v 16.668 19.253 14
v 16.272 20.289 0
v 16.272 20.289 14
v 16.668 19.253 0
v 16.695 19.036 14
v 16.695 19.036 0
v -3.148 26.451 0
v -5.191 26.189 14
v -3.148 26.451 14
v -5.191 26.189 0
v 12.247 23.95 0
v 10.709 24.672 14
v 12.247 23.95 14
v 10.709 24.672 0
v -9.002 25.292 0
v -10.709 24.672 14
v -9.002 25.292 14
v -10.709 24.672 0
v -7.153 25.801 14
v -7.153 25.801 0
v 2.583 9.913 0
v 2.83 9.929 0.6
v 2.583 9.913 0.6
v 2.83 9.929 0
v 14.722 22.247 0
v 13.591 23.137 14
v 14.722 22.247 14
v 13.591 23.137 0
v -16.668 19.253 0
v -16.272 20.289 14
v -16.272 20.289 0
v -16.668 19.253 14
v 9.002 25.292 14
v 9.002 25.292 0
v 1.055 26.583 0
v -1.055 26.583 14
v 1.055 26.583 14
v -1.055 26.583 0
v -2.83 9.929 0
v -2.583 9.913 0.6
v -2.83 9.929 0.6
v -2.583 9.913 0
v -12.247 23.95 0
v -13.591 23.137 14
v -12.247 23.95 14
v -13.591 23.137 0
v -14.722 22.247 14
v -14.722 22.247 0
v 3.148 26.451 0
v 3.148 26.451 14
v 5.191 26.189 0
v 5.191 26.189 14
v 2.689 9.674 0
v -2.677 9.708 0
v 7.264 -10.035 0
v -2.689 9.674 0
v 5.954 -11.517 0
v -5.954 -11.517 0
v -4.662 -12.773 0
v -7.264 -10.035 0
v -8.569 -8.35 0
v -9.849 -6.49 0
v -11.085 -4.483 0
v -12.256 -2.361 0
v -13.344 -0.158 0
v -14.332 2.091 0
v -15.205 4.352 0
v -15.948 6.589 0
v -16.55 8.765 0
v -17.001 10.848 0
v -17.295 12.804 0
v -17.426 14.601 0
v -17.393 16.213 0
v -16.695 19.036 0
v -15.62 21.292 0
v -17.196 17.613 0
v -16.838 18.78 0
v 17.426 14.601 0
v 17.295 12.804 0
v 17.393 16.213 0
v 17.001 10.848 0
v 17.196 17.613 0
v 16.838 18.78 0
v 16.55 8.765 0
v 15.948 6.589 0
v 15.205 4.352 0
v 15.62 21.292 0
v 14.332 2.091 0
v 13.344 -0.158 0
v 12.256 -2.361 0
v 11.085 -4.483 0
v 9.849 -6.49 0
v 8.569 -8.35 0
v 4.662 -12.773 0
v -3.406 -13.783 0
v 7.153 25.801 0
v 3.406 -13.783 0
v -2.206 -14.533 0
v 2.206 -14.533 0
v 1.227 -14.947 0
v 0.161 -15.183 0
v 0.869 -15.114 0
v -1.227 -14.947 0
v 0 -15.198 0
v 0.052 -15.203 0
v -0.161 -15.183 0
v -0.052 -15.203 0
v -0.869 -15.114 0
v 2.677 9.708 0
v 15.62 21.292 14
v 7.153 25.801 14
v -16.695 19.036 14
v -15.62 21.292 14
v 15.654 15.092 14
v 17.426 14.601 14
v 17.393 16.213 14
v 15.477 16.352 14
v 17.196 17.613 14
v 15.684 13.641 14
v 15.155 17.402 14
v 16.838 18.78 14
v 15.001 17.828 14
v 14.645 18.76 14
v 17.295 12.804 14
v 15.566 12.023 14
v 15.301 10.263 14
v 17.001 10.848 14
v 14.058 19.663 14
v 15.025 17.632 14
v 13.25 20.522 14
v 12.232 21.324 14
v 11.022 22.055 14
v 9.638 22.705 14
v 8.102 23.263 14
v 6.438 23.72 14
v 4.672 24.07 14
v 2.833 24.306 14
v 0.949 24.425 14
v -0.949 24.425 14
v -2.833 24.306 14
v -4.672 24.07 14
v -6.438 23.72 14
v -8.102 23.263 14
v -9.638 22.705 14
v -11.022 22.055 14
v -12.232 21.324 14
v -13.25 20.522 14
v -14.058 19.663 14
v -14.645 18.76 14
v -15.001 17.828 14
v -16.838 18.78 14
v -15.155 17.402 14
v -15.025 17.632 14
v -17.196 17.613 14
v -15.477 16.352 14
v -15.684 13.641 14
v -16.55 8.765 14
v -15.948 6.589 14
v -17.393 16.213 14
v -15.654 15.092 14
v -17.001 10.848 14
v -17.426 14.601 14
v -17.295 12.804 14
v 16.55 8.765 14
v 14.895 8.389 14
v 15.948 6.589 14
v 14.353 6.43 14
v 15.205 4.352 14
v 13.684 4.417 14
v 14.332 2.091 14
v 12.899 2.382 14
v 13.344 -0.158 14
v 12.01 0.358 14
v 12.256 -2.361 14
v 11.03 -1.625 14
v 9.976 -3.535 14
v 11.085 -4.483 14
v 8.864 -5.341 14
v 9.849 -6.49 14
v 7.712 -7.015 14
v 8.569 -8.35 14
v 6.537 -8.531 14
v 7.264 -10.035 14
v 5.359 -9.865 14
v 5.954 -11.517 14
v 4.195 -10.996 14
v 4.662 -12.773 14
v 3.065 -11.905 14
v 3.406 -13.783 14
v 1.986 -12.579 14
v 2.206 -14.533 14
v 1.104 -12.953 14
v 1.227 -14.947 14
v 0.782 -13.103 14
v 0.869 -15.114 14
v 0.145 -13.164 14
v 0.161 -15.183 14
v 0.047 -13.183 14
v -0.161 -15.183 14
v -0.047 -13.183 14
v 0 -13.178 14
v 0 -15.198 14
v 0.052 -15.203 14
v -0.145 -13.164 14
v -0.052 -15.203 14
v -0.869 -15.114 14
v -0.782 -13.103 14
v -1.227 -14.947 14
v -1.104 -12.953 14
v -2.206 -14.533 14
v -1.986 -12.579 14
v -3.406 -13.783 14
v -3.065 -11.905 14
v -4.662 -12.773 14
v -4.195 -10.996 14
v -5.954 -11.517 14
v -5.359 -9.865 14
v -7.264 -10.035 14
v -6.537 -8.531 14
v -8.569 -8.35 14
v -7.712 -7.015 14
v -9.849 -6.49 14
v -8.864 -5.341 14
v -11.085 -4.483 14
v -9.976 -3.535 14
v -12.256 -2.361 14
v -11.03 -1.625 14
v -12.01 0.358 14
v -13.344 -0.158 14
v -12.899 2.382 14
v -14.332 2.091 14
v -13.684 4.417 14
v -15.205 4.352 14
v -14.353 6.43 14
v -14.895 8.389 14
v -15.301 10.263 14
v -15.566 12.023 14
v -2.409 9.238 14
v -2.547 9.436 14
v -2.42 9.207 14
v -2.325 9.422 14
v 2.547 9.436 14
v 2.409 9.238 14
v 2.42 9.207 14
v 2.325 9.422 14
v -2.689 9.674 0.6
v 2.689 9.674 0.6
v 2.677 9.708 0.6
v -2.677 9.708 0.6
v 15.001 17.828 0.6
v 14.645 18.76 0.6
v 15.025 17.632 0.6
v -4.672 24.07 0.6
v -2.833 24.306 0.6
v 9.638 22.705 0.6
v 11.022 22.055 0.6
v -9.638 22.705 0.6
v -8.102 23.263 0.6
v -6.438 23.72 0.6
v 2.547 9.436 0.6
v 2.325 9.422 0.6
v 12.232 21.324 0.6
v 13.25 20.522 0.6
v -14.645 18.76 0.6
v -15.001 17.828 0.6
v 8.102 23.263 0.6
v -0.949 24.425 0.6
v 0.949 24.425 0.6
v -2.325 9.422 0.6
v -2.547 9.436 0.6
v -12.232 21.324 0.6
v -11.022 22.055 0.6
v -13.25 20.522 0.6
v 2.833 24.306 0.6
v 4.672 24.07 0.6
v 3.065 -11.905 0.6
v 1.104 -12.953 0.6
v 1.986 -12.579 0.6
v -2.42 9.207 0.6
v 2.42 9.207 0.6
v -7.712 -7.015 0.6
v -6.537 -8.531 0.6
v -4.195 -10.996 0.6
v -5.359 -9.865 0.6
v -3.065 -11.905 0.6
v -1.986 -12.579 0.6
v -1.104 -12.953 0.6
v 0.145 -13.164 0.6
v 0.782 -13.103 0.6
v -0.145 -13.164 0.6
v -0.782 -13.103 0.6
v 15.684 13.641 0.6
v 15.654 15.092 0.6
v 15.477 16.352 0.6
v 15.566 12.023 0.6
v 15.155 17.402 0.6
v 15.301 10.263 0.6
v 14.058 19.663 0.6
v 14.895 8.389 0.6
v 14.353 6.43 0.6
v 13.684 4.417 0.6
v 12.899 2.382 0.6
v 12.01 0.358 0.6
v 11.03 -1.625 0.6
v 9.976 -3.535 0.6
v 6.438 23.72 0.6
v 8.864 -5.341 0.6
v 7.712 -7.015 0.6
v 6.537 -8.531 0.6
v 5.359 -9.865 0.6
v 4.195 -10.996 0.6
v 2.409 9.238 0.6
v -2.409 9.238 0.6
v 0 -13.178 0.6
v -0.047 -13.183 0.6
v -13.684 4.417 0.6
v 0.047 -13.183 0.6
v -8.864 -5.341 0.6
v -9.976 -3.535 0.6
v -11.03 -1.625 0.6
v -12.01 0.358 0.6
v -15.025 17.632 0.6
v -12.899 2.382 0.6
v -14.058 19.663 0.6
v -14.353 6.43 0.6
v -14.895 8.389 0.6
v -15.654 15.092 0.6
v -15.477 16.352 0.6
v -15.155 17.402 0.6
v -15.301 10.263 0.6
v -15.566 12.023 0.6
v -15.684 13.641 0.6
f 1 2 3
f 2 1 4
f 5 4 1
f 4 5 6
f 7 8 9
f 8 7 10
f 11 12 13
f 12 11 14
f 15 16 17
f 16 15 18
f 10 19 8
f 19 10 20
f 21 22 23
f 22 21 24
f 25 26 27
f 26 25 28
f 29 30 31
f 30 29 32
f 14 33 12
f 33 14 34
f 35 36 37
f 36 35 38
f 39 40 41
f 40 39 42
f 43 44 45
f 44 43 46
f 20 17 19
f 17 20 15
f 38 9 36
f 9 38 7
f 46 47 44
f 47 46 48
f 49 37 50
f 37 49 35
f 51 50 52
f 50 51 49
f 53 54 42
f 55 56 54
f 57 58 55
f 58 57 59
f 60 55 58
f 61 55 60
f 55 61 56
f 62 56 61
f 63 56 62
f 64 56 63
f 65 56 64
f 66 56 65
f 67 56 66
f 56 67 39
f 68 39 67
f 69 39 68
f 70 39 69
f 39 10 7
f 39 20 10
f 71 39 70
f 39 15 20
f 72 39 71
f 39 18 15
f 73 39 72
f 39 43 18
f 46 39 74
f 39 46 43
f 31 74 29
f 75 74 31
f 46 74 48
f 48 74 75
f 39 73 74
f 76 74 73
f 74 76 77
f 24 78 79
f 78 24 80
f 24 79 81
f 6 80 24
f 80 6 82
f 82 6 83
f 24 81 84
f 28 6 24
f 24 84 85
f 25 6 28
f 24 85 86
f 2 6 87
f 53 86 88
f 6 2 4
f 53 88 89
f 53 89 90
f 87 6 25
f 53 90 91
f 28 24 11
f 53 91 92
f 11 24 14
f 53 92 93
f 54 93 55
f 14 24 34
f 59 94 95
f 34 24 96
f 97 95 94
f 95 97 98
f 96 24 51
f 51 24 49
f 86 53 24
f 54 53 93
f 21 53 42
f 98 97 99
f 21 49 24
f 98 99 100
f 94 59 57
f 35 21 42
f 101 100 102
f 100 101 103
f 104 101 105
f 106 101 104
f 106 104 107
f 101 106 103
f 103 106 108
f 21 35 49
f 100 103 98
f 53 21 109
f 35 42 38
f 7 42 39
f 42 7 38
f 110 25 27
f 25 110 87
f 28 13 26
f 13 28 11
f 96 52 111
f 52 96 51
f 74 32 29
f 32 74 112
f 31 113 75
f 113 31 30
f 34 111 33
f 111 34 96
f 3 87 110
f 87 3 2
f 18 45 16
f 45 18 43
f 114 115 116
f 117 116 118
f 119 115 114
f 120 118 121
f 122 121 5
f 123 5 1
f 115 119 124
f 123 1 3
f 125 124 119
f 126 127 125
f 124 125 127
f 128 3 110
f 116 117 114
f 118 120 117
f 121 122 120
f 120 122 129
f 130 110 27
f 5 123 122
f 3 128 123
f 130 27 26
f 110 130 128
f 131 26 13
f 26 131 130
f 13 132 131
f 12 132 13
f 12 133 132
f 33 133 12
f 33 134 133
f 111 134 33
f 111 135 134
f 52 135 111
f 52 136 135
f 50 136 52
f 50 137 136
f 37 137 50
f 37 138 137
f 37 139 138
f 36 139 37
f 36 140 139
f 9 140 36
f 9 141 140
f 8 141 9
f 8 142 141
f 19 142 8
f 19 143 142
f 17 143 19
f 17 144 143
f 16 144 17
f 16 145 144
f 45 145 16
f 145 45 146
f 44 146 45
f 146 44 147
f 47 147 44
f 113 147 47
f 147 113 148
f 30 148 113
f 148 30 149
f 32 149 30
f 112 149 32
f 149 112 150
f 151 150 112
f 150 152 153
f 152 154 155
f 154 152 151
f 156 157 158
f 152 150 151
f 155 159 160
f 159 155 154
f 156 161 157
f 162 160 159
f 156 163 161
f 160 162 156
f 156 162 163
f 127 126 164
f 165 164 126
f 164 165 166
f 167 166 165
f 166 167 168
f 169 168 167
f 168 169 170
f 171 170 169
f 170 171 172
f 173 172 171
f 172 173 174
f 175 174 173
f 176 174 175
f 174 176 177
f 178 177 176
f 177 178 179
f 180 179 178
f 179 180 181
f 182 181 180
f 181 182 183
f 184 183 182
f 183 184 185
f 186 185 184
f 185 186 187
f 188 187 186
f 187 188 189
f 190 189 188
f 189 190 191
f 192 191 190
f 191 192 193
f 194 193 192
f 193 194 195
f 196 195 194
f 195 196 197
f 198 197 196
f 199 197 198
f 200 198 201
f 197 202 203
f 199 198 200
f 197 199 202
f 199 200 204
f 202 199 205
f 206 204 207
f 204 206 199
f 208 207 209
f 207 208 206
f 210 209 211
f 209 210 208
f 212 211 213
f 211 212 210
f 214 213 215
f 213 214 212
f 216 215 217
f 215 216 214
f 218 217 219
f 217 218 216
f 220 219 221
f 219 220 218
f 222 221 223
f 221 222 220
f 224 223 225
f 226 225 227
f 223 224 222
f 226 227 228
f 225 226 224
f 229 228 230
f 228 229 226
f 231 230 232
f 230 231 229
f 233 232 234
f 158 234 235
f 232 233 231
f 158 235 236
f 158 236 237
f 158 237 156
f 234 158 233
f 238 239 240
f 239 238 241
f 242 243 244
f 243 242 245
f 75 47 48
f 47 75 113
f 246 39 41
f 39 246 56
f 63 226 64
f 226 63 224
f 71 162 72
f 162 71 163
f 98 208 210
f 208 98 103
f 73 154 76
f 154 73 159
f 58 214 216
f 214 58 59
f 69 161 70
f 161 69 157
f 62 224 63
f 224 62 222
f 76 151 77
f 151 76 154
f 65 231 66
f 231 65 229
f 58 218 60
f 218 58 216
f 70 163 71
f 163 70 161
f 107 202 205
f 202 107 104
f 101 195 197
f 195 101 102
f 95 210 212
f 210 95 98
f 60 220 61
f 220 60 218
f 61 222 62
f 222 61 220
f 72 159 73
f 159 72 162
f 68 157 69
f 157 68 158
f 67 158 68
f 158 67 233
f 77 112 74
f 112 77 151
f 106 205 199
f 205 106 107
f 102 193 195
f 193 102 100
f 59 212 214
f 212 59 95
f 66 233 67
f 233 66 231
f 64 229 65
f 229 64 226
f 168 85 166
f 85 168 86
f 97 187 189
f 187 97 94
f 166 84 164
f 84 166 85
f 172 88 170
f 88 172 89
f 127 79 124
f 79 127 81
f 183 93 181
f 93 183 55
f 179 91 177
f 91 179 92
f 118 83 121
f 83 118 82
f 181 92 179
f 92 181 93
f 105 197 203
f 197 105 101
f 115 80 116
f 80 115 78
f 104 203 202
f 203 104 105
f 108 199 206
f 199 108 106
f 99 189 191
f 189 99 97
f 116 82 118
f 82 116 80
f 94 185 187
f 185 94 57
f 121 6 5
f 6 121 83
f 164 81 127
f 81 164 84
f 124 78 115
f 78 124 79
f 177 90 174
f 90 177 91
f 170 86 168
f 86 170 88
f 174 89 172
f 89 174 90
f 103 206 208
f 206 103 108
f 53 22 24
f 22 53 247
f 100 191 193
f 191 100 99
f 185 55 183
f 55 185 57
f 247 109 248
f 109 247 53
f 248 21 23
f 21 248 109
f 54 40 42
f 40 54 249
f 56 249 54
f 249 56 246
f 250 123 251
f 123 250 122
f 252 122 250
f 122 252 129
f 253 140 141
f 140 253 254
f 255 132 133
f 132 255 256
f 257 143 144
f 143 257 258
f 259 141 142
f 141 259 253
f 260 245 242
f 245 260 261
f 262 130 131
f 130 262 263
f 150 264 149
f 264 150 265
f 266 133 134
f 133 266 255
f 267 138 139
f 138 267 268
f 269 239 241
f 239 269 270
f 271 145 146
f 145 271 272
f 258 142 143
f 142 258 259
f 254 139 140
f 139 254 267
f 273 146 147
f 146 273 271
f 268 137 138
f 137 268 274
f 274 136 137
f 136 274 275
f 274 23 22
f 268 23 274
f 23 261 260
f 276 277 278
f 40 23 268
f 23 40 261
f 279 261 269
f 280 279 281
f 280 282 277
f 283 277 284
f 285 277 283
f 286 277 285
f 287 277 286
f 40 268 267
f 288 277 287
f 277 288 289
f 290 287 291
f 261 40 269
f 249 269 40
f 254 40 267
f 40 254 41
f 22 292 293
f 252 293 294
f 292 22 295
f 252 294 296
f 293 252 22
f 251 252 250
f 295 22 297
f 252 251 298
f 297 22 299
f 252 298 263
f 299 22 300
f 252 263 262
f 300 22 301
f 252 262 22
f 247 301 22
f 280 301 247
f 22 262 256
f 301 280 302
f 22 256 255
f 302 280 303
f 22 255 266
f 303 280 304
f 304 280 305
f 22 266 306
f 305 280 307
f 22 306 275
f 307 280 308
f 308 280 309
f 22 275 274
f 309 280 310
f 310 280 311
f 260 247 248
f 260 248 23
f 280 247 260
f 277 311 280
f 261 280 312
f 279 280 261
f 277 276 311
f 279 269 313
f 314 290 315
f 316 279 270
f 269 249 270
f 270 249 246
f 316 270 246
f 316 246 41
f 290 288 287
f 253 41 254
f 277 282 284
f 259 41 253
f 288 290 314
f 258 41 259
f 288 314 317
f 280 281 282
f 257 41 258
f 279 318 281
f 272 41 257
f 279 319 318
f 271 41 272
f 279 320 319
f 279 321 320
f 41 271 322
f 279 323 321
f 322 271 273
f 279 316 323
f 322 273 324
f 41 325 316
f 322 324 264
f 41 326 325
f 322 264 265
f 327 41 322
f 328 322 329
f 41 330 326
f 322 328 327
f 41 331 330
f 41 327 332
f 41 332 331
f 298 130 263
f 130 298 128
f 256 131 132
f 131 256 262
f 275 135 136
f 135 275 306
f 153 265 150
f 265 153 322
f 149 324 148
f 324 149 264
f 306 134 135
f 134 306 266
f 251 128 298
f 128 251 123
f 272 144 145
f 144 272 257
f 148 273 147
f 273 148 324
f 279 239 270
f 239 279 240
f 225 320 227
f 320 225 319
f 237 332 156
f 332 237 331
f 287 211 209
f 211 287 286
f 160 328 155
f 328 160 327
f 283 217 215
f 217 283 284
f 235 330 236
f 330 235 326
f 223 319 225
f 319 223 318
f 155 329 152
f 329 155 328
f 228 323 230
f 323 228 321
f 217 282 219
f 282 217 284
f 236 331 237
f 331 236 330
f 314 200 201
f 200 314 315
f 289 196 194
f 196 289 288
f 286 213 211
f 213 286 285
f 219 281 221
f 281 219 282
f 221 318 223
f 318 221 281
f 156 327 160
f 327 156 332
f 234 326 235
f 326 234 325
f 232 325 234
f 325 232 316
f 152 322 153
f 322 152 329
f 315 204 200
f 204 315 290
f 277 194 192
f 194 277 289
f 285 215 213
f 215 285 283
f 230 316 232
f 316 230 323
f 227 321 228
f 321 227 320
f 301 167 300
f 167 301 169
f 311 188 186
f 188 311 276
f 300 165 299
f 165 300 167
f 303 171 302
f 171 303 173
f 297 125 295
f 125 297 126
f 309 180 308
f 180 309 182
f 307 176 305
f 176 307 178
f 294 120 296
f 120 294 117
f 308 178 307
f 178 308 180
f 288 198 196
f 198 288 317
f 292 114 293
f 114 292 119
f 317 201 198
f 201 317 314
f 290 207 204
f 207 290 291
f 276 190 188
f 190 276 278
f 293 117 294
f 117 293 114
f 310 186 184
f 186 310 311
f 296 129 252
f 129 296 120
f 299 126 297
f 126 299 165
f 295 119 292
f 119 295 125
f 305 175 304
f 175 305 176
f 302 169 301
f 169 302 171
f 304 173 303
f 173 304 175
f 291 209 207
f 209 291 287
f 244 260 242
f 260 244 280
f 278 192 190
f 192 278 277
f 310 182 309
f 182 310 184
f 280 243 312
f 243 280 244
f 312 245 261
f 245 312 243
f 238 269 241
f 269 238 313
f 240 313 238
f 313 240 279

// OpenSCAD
pick_height=60;

/*
pick shape based on:
https://www.thingiverse.com/thing:1672392
*/
module plek(height) {
	$fn=50;
	translate([0, 0, height/2])union() {
		translate([0,13,0]) scale([2,1,1])cylinder(r=6, h=height, center=true);
		translate([-5,2,0]) rotate([0,0,25])scale([1,2.8,1])cylinder(r=5, h=height, center=true);
		translate([ 5,2,0]) rotate([0,0,-25])scale([1,2.8,1])cylinder(r=5, h=height, center=true);
		rotate([0,0,0]) scale([1,3,1]) cylinder(r=3, h=height, center=true);
        
	}
}

module box() {
    s1 = 1.25;
    difference() {
        scale([s1, s1, s1], center=true) translate([0, 0, 0]) plek(60);

        s2 = 1.1;
        color([1, 0, 0])
        translate([0, 0.5, 0.6])
        scale([s2, s2, s2*3], center=true)  plek(60);
    }
}


module lid() {
    s3 = 1.40;
    difference() {
        scale([s3, s3, s3], center=true) translate([0, 0, 0]) plek(10);

        s4 = 1.26;
        color([1, 0, 0])
        translate([0, 0.5, 0.6])
        scale([s4, s4, s4*3], center=true)  plek(10);
    }
}

lid();
